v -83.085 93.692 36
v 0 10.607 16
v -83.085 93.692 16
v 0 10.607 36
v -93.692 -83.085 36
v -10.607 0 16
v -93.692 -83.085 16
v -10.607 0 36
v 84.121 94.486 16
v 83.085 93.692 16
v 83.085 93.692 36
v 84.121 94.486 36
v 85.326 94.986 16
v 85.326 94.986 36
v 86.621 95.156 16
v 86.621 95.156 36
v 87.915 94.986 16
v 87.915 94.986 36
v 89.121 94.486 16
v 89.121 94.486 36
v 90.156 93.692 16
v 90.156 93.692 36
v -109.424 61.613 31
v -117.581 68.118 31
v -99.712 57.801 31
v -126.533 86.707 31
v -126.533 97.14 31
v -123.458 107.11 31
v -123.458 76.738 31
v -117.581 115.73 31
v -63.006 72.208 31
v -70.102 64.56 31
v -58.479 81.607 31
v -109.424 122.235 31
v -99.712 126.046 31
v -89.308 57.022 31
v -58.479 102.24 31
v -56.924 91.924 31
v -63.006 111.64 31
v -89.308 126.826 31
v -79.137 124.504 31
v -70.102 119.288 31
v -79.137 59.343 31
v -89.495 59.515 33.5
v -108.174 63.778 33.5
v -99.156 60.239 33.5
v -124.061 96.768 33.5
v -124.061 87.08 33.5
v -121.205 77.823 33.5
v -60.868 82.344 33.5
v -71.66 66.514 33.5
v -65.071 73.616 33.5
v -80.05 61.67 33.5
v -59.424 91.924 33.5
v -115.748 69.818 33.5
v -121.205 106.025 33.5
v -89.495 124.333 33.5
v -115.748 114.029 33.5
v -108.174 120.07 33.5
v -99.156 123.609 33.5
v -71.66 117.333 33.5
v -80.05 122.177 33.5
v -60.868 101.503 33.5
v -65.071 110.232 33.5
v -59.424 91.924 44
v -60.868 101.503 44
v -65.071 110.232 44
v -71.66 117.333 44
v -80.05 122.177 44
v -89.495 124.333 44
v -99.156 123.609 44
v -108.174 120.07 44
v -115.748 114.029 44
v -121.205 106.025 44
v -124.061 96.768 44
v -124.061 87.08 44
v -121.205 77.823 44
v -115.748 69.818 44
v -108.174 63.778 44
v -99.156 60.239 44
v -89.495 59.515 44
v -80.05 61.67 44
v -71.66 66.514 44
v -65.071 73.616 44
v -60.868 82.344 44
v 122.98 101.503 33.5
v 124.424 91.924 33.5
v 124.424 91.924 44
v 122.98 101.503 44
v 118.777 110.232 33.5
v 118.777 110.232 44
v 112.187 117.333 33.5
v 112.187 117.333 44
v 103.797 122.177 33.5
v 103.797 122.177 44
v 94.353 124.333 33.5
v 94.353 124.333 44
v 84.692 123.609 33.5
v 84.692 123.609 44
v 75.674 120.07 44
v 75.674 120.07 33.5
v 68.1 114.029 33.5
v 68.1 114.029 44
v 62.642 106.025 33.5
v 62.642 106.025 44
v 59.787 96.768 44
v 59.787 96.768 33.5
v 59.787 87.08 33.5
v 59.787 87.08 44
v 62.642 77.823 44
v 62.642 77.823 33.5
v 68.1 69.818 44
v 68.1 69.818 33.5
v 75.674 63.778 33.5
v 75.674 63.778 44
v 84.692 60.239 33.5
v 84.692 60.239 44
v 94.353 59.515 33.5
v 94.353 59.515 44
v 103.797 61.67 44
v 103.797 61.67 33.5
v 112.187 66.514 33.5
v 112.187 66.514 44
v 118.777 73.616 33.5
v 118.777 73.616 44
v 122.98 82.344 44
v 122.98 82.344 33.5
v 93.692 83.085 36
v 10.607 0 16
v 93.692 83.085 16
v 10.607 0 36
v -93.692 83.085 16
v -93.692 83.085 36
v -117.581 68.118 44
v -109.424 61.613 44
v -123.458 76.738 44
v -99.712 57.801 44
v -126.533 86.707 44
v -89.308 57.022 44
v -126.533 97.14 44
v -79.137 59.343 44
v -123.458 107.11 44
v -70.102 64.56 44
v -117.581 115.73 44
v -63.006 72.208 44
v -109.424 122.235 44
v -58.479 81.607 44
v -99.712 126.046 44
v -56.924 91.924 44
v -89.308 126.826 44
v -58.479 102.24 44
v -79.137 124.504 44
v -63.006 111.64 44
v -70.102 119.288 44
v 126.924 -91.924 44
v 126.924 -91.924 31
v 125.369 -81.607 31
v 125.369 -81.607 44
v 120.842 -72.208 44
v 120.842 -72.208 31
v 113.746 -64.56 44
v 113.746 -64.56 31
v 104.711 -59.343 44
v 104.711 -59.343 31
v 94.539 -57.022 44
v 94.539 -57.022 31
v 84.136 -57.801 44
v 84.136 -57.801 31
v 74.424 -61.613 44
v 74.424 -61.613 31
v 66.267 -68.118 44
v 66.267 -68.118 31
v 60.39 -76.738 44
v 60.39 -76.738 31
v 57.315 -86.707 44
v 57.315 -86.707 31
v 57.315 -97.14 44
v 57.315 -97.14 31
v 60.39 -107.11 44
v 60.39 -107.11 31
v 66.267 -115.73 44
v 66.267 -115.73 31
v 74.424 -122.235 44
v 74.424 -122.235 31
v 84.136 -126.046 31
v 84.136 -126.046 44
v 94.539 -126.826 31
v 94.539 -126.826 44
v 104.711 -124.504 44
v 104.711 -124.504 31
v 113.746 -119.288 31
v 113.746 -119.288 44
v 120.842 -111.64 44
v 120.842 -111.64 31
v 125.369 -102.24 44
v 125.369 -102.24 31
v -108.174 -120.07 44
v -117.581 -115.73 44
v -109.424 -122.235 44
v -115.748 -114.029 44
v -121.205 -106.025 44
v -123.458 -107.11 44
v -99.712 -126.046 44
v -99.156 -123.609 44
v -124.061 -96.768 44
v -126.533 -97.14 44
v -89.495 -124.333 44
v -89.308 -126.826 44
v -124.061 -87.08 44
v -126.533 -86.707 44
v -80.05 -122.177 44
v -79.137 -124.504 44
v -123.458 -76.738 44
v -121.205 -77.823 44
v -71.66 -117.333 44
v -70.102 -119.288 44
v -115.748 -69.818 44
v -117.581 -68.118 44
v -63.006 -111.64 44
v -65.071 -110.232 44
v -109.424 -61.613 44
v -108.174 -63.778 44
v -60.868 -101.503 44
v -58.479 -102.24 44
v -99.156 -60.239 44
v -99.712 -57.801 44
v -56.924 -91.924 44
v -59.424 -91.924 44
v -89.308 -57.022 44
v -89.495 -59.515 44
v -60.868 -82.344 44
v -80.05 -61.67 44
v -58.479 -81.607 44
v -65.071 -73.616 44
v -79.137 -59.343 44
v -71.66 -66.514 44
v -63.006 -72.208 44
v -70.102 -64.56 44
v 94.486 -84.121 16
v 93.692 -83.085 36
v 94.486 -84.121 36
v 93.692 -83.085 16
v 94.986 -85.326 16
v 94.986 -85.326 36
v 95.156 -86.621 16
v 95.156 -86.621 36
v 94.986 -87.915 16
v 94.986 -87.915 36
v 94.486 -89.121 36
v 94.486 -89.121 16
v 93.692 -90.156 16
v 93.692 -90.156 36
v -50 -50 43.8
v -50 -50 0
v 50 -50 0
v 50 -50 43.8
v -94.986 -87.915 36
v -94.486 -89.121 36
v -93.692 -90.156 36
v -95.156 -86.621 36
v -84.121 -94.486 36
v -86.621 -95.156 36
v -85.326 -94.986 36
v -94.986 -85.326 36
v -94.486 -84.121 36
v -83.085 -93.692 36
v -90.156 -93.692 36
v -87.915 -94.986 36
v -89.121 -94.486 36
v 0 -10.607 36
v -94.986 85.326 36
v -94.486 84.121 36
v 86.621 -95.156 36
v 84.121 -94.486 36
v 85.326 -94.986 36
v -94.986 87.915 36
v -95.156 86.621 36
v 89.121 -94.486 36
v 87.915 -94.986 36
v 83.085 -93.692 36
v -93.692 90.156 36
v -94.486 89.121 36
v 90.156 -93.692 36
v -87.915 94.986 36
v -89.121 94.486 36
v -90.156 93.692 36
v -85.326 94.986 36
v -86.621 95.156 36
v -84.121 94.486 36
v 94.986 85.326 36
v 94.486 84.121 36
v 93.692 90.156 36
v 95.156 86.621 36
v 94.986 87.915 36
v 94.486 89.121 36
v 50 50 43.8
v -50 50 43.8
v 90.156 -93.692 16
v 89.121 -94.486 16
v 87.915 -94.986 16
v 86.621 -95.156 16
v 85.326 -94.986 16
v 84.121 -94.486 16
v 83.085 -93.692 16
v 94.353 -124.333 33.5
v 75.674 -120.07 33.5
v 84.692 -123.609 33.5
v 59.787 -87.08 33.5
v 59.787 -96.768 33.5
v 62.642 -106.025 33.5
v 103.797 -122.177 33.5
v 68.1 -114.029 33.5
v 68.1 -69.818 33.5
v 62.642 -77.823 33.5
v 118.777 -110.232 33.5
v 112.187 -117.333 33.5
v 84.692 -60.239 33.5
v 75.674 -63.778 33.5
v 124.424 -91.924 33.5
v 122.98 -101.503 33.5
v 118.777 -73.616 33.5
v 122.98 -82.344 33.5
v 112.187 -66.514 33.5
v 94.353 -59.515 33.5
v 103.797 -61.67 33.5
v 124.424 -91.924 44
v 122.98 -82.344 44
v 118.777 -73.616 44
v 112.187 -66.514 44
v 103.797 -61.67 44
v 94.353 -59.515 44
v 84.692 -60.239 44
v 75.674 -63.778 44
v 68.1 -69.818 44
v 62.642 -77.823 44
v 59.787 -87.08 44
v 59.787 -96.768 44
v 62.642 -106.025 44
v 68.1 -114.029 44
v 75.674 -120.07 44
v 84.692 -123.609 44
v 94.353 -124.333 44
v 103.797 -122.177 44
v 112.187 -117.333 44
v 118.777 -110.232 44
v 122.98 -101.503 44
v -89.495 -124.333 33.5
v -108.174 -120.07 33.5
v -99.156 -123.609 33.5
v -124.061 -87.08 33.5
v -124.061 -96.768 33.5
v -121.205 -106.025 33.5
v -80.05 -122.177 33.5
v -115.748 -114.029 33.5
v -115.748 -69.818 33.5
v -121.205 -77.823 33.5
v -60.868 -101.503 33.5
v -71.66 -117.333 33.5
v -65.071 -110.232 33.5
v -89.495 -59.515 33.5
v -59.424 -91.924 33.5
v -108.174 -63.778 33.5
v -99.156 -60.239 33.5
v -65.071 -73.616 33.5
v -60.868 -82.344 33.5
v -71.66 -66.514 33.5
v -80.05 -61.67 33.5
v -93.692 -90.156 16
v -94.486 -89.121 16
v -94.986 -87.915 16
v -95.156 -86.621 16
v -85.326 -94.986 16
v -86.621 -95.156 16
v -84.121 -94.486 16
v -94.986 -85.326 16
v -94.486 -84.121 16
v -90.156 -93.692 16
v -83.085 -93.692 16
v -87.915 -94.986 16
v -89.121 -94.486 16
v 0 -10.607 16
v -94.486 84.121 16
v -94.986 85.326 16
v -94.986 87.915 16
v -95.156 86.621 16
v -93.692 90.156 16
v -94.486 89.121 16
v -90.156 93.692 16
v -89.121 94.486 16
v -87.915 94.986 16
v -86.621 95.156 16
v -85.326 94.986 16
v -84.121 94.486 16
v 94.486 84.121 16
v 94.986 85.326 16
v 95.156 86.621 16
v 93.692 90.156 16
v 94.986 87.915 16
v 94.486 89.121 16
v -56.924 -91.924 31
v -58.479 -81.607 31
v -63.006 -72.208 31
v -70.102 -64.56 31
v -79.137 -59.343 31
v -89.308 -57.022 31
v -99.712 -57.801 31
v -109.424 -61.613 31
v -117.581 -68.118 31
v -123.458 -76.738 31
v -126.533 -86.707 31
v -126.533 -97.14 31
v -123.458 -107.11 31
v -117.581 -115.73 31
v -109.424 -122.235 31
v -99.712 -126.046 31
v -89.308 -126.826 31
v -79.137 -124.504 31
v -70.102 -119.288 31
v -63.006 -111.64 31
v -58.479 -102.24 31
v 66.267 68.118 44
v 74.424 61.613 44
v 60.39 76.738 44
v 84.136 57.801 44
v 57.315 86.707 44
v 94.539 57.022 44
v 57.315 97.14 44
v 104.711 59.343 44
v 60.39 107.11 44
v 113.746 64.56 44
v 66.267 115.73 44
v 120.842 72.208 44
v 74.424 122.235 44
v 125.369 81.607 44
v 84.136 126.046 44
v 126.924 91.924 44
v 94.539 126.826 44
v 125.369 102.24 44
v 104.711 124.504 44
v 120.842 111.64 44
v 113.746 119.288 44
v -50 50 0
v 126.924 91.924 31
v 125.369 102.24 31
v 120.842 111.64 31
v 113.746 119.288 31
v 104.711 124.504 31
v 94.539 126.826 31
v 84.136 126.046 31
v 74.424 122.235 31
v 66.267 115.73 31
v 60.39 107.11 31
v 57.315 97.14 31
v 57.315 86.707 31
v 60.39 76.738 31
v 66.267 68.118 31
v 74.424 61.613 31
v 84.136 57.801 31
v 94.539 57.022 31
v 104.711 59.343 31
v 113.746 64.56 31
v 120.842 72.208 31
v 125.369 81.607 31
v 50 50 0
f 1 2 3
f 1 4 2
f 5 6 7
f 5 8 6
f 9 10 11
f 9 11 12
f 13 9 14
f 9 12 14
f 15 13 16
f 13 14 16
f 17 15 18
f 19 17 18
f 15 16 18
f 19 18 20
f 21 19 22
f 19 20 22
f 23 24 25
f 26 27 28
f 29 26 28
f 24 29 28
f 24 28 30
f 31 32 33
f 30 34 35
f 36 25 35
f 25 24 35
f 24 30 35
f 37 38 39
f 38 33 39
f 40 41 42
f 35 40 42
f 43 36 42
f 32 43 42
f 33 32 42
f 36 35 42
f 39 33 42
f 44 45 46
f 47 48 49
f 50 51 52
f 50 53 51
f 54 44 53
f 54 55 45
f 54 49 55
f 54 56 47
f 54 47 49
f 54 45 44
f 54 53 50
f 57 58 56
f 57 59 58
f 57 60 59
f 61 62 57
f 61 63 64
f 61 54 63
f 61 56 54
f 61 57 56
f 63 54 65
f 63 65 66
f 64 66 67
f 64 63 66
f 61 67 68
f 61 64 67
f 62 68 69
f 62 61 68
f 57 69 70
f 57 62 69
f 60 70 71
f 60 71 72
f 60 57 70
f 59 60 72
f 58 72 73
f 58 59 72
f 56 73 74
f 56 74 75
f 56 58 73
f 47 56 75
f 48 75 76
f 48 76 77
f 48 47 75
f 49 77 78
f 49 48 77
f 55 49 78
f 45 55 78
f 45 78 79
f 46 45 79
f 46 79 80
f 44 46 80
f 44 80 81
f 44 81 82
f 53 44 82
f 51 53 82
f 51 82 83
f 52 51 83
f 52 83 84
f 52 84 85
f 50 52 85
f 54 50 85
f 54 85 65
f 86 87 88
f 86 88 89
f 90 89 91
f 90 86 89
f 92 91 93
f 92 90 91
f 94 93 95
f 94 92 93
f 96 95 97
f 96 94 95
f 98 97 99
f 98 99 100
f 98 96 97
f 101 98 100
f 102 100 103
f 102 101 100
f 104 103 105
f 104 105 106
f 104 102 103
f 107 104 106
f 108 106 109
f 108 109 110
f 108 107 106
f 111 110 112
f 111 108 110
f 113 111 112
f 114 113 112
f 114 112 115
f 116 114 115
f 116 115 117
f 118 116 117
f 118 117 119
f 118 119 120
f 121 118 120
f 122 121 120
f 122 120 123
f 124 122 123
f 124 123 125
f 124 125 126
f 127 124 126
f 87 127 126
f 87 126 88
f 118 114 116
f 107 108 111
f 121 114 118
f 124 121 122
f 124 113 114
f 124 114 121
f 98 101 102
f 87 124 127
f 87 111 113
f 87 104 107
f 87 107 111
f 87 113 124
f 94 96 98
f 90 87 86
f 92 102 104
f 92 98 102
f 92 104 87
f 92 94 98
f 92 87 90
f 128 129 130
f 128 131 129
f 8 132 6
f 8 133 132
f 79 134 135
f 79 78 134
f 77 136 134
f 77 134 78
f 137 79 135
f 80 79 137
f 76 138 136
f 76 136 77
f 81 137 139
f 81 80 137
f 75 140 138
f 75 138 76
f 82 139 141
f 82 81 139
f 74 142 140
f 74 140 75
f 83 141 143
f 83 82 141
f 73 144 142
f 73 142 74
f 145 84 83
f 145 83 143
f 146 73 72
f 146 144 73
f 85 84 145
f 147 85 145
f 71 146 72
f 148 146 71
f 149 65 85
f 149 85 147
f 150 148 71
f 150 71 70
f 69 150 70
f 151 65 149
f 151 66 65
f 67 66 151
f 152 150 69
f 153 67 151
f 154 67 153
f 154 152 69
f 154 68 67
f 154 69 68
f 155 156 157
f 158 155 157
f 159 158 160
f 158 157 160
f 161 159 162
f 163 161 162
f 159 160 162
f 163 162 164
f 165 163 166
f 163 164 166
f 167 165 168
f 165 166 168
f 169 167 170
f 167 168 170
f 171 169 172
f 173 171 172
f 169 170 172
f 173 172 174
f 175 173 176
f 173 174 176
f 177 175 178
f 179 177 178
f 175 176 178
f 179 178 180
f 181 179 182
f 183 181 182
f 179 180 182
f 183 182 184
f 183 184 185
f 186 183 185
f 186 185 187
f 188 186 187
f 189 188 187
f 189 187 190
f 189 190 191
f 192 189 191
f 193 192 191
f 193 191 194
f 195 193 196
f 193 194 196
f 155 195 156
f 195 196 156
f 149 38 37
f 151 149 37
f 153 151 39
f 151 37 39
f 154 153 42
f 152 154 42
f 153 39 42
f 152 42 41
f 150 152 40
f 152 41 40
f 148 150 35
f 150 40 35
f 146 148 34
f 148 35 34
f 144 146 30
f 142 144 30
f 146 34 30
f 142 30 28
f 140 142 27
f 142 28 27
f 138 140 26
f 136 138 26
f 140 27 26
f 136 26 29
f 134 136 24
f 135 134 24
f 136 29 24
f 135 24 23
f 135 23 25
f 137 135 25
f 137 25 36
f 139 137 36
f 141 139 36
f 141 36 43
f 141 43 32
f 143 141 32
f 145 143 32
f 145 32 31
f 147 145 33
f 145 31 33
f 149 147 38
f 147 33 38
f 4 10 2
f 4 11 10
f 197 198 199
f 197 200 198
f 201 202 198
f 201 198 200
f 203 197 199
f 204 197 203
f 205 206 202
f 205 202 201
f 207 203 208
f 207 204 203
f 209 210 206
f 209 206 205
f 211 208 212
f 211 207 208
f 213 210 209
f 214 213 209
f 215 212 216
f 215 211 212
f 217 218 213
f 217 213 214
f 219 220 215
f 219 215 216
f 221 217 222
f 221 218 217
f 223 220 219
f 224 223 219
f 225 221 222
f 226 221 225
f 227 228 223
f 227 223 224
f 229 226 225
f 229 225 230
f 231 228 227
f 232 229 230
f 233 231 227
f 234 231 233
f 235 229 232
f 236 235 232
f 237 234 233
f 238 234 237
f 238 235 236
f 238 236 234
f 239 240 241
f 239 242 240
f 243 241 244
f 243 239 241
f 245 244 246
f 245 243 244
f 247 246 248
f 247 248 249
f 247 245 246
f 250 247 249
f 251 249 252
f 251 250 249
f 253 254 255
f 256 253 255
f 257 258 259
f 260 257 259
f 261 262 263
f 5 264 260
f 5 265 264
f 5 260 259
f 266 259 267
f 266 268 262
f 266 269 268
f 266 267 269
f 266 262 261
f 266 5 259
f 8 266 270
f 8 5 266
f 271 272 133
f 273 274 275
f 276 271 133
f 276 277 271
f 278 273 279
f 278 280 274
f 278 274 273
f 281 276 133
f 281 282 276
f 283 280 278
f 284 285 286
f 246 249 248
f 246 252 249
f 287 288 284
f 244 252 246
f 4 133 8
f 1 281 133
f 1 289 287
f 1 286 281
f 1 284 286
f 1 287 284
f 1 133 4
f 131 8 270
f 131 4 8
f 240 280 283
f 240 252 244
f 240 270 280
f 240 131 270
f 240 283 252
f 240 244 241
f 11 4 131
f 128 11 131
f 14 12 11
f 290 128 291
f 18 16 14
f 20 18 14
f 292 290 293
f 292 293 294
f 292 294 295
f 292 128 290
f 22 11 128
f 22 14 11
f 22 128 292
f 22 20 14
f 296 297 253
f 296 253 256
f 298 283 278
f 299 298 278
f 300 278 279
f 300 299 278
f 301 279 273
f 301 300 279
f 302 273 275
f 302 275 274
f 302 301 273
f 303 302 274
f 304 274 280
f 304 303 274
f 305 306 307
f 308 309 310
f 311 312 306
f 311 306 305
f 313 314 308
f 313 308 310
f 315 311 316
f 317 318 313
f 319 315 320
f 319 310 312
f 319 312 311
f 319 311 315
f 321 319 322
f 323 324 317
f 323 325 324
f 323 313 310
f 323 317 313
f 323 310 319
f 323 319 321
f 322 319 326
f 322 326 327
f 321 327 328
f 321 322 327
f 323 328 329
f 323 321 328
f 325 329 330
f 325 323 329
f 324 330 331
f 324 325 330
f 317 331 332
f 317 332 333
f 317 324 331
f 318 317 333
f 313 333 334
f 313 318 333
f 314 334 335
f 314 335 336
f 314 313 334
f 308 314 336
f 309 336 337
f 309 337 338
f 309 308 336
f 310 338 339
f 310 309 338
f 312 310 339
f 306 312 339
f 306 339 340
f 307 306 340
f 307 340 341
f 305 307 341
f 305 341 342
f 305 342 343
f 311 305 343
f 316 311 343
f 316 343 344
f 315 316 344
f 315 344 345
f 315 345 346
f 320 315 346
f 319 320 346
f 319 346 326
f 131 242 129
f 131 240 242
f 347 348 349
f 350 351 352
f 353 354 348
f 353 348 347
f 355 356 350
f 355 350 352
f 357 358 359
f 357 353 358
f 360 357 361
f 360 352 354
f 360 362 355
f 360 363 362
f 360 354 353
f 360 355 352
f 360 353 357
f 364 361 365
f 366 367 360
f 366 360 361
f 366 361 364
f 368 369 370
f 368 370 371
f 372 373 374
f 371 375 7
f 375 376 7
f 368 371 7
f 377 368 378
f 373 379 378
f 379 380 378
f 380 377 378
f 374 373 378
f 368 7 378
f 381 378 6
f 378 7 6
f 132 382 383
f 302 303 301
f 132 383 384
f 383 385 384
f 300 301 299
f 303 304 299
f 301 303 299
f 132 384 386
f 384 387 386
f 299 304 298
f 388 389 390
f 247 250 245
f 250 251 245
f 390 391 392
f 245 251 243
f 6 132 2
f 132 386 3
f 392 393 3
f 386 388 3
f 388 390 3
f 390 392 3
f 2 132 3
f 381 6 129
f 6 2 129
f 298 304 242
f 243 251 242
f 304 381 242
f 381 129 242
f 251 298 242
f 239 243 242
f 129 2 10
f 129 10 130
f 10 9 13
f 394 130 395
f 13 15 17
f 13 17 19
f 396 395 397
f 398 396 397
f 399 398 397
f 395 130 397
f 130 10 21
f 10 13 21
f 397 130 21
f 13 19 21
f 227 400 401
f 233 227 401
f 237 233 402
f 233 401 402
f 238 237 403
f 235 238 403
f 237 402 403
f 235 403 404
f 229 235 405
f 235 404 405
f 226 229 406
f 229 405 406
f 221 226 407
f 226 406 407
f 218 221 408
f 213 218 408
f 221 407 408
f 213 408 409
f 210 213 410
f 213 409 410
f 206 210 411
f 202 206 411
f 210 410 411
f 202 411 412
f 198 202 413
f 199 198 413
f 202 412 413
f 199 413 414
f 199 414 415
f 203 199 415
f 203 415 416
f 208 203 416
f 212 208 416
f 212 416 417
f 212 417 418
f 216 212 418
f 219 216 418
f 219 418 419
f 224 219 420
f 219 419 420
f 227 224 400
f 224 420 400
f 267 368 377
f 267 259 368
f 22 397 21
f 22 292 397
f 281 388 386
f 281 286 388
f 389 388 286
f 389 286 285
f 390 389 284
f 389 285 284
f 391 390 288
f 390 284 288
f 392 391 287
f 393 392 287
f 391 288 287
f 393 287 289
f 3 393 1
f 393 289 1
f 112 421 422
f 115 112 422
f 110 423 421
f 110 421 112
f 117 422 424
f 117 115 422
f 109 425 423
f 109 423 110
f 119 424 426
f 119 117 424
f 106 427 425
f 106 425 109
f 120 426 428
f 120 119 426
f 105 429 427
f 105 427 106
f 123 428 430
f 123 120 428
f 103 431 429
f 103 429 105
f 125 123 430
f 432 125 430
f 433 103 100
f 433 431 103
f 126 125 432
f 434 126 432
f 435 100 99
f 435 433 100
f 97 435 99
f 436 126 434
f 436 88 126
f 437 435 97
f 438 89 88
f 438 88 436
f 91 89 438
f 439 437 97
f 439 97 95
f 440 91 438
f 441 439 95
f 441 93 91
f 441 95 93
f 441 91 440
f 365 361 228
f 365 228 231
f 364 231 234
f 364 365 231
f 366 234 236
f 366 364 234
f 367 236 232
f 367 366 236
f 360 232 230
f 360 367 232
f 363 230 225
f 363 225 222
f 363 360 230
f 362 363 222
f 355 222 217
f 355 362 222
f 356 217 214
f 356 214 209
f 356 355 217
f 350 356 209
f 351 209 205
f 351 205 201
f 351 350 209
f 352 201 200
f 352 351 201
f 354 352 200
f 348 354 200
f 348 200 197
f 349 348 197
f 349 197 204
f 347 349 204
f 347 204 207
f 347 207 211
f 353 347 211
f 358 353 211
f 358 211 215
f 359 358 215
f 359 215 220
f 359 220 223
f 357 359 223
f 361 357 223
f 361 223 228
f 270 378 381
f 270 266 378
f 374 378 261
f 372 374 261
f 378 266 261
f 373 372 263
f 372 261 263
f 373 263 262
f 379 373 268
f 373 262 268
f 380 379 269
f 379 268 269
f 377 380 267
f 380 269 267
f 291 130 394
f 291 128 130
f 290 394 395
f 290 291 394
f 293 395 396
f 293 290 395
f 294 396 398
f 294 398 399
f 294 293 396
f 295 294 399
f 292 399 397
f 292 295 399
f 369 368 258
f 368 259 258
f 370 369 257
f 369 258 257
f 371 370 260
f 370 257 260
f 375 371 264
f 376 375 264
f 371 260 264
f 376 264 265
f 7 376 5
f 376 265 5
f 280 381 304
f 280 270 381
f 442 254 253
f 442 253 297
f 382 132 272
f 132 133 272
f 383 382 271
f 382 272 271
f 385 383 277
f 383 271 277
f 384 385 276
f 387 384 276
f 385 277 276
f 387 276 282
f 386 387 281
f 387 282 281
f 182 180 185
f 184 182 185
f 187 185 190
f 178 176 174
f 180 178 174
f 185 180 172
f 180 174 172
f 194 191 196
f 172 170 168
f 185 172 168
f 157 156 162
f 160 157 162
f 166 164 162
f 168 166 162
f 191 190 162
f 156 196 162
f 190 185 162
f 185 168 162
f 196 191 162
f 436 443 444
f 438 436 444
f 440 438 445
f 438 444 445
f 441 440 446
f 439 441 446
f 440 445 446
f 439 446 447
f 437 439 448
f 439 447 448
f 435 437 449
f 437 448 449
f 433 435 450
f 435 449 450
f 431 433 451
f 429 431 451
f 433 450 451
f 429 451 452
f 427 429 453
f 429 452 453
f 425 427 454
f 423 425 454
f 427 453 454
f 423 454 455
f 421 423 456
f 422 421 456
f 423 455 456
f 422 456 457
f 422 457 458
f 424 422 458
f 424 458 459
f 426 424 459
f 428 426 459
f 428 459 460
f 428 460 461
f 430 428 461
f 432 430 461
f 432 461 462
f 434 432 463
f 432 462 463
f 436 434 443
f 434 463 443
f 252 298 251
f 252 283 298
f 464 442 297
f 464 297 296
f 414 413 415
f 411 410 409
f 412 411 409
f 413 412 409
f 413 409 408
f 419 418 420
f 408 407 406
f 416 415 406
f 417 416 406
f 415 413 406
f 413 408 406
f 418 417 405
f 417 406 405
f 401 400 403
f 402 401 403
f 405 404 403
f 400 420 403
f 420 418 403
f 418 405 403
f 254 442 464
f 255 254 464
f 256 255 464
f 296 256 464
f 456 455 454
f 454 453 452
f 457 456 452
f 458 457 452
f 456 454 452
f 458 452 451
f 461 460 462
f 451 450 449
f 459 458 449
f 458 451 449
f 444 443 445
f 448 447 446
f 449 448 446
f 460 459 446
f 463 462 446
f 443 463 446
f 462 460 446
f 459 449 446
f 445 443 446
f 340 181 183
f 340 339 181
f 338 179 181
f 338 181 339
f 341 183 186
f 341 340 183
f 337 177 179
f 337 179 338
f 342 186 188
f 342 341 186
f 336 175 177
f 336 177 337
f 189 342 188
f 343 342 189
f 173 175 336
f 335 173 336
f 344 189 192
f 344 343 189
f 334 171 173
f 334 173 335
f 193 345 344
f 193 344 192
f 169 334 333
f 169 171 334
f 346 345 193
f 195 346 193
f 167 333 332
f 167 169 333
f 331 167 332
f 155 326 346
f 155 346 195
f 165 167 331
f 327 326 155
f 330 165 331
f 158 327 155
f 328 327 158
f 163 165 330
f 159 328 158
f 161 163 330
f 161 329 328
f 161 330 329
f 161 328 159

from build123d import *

# Parameters (mm, degrees)
F4_R          = 35
F5_DEPTH      = 13
F0_W          = 100
F0_H          = 100
F6_DEPTH      = 43.8
F8_DEPTH      = 5
F8_DEPTH_BACK = 15
F10_T         = -2.5
F10_2_T       = -2.5
F10_3_T       = -2.5
F10_4_T       = -2.5
F11_R         = 5


with BuildPart() as f5:
    # F4 (on offset) → F5 (new body)
    with BuildSketch(Plane.XY.offset(31)):
        with Locations((91.9238815543, 91.9238815543)):
            Circle(F4_R)
    extrude(amount=F5_DEPTH)

    # F10#3
    f10_3_openings = [f5.faces().sort_by_distance(p)[0] for p in [
        (91.923882, 91.923882, 44),
    ]]
    offset(amount=F10_3_T, openings=f10_3_openings)


with BuildPart() as f5b:
    # F4 (on offset) → F5, piece 2 (new body)
    with BuildSketch(Plane.XY.offset(31)):
        with Locations((-91.9238815543, 91.9238815543)):
            Circle(F4_R)
    extrude(amount=F5_DEPTH)

    # F10#4
    f10_4_openings = [f5b.faces().sort_by_distance(p)[0] for p in [
        (-91.923882, 91.923882, 44),
    ]]
    offset(amount=F10_4_T, openings=f10_4_openings)


with BuildPart() as f5c:
    # F4 (on offset) → F5, piece 3 (new body)
    with BuildSketch(Plane.XY.offset(31)):
        with Locations((-91.9238815543, -91.9238815543)):
            Circle(F4_R)
    extrude(amount=F5_DEPTH)

    # F10#2
    f10_2_openings = [f5c.faces().sort_by_distance(p)[0] for p in [
        (-91.923882, -91.923882, 44),
    ]]
    offset(amount=F10_2_T, openings=f10_2_openings)


with BuildPart() as f5d:
    # F4 (on offset) → F5, piece 4 (new body)
    with BuildSketch(Plane.XY.offset(31)):
        with Locations((91.9238815543, -91.9238815543)):
            Circle(F4_R)
    extrude(amount=F5_DEPTH)

    # F10
    f10_openings = [f5d.faces().sort_by_distance(p)[0] for p in [
        (91.923882, -91.923882, 44),
    ]]
    offset(amount=F10_T, openings=f10_openings)


with BuildPart() as f6:
    # F0 (on Top) → F6 (new body)
    with BuildSketch(Plane.XY):
        Rectangle(F0_W, F0_H)
    extrude(amount=F6_DEPTH)


with BuildPart() as f8:
    # F7 (on offset) → F8 (new body, two sides)
    with BuildSketch(Plane.XY.offset(31)) as f8_sk:
        Polygon((10.6066017178, 0), (97.2271824132, 86.6205806954), (86.6205806954, 97.2271824132), (0, 10.6066017178), (-86.6205806954, 97.2271824132), (-97.2271824132, 86.6205806954), (-10.6066017178, 0), (-97.2271824132, -86.6205806954), (-86.6205806954, -97.2271824132), (0, -10.6066017178), (86.6205806954, -97.2271824132), (97.2271824132, -86.6205806954), align=None)
    extrude(amount=F8_DEPTH)
    extrude(f8_sk.sketch, amount=-F8_DEPTH_BACK)

    # F11
    f11_edges = [f8.edges().sort_by_distance(p)[0] for p in [
        (-97.227182, -86.620581, 26),
        (-86.620581, -97.227182, 26),
        (97.227182, -86.620581, 26),
        (86.620581, -97.227182, 26),
        (-86.620581, 97.227182, 26),
        (-97.227182, 86.620581, 26),
        (97.227182, 86.620581, 26),
        (86.620581, 97.227182, 26),
    ]]
    fillet(f11_edges, radius=F11_R)


solid = Compound([f5.part, f5b.part, f5c.part, f5d.part, f6.part, f8.part])
